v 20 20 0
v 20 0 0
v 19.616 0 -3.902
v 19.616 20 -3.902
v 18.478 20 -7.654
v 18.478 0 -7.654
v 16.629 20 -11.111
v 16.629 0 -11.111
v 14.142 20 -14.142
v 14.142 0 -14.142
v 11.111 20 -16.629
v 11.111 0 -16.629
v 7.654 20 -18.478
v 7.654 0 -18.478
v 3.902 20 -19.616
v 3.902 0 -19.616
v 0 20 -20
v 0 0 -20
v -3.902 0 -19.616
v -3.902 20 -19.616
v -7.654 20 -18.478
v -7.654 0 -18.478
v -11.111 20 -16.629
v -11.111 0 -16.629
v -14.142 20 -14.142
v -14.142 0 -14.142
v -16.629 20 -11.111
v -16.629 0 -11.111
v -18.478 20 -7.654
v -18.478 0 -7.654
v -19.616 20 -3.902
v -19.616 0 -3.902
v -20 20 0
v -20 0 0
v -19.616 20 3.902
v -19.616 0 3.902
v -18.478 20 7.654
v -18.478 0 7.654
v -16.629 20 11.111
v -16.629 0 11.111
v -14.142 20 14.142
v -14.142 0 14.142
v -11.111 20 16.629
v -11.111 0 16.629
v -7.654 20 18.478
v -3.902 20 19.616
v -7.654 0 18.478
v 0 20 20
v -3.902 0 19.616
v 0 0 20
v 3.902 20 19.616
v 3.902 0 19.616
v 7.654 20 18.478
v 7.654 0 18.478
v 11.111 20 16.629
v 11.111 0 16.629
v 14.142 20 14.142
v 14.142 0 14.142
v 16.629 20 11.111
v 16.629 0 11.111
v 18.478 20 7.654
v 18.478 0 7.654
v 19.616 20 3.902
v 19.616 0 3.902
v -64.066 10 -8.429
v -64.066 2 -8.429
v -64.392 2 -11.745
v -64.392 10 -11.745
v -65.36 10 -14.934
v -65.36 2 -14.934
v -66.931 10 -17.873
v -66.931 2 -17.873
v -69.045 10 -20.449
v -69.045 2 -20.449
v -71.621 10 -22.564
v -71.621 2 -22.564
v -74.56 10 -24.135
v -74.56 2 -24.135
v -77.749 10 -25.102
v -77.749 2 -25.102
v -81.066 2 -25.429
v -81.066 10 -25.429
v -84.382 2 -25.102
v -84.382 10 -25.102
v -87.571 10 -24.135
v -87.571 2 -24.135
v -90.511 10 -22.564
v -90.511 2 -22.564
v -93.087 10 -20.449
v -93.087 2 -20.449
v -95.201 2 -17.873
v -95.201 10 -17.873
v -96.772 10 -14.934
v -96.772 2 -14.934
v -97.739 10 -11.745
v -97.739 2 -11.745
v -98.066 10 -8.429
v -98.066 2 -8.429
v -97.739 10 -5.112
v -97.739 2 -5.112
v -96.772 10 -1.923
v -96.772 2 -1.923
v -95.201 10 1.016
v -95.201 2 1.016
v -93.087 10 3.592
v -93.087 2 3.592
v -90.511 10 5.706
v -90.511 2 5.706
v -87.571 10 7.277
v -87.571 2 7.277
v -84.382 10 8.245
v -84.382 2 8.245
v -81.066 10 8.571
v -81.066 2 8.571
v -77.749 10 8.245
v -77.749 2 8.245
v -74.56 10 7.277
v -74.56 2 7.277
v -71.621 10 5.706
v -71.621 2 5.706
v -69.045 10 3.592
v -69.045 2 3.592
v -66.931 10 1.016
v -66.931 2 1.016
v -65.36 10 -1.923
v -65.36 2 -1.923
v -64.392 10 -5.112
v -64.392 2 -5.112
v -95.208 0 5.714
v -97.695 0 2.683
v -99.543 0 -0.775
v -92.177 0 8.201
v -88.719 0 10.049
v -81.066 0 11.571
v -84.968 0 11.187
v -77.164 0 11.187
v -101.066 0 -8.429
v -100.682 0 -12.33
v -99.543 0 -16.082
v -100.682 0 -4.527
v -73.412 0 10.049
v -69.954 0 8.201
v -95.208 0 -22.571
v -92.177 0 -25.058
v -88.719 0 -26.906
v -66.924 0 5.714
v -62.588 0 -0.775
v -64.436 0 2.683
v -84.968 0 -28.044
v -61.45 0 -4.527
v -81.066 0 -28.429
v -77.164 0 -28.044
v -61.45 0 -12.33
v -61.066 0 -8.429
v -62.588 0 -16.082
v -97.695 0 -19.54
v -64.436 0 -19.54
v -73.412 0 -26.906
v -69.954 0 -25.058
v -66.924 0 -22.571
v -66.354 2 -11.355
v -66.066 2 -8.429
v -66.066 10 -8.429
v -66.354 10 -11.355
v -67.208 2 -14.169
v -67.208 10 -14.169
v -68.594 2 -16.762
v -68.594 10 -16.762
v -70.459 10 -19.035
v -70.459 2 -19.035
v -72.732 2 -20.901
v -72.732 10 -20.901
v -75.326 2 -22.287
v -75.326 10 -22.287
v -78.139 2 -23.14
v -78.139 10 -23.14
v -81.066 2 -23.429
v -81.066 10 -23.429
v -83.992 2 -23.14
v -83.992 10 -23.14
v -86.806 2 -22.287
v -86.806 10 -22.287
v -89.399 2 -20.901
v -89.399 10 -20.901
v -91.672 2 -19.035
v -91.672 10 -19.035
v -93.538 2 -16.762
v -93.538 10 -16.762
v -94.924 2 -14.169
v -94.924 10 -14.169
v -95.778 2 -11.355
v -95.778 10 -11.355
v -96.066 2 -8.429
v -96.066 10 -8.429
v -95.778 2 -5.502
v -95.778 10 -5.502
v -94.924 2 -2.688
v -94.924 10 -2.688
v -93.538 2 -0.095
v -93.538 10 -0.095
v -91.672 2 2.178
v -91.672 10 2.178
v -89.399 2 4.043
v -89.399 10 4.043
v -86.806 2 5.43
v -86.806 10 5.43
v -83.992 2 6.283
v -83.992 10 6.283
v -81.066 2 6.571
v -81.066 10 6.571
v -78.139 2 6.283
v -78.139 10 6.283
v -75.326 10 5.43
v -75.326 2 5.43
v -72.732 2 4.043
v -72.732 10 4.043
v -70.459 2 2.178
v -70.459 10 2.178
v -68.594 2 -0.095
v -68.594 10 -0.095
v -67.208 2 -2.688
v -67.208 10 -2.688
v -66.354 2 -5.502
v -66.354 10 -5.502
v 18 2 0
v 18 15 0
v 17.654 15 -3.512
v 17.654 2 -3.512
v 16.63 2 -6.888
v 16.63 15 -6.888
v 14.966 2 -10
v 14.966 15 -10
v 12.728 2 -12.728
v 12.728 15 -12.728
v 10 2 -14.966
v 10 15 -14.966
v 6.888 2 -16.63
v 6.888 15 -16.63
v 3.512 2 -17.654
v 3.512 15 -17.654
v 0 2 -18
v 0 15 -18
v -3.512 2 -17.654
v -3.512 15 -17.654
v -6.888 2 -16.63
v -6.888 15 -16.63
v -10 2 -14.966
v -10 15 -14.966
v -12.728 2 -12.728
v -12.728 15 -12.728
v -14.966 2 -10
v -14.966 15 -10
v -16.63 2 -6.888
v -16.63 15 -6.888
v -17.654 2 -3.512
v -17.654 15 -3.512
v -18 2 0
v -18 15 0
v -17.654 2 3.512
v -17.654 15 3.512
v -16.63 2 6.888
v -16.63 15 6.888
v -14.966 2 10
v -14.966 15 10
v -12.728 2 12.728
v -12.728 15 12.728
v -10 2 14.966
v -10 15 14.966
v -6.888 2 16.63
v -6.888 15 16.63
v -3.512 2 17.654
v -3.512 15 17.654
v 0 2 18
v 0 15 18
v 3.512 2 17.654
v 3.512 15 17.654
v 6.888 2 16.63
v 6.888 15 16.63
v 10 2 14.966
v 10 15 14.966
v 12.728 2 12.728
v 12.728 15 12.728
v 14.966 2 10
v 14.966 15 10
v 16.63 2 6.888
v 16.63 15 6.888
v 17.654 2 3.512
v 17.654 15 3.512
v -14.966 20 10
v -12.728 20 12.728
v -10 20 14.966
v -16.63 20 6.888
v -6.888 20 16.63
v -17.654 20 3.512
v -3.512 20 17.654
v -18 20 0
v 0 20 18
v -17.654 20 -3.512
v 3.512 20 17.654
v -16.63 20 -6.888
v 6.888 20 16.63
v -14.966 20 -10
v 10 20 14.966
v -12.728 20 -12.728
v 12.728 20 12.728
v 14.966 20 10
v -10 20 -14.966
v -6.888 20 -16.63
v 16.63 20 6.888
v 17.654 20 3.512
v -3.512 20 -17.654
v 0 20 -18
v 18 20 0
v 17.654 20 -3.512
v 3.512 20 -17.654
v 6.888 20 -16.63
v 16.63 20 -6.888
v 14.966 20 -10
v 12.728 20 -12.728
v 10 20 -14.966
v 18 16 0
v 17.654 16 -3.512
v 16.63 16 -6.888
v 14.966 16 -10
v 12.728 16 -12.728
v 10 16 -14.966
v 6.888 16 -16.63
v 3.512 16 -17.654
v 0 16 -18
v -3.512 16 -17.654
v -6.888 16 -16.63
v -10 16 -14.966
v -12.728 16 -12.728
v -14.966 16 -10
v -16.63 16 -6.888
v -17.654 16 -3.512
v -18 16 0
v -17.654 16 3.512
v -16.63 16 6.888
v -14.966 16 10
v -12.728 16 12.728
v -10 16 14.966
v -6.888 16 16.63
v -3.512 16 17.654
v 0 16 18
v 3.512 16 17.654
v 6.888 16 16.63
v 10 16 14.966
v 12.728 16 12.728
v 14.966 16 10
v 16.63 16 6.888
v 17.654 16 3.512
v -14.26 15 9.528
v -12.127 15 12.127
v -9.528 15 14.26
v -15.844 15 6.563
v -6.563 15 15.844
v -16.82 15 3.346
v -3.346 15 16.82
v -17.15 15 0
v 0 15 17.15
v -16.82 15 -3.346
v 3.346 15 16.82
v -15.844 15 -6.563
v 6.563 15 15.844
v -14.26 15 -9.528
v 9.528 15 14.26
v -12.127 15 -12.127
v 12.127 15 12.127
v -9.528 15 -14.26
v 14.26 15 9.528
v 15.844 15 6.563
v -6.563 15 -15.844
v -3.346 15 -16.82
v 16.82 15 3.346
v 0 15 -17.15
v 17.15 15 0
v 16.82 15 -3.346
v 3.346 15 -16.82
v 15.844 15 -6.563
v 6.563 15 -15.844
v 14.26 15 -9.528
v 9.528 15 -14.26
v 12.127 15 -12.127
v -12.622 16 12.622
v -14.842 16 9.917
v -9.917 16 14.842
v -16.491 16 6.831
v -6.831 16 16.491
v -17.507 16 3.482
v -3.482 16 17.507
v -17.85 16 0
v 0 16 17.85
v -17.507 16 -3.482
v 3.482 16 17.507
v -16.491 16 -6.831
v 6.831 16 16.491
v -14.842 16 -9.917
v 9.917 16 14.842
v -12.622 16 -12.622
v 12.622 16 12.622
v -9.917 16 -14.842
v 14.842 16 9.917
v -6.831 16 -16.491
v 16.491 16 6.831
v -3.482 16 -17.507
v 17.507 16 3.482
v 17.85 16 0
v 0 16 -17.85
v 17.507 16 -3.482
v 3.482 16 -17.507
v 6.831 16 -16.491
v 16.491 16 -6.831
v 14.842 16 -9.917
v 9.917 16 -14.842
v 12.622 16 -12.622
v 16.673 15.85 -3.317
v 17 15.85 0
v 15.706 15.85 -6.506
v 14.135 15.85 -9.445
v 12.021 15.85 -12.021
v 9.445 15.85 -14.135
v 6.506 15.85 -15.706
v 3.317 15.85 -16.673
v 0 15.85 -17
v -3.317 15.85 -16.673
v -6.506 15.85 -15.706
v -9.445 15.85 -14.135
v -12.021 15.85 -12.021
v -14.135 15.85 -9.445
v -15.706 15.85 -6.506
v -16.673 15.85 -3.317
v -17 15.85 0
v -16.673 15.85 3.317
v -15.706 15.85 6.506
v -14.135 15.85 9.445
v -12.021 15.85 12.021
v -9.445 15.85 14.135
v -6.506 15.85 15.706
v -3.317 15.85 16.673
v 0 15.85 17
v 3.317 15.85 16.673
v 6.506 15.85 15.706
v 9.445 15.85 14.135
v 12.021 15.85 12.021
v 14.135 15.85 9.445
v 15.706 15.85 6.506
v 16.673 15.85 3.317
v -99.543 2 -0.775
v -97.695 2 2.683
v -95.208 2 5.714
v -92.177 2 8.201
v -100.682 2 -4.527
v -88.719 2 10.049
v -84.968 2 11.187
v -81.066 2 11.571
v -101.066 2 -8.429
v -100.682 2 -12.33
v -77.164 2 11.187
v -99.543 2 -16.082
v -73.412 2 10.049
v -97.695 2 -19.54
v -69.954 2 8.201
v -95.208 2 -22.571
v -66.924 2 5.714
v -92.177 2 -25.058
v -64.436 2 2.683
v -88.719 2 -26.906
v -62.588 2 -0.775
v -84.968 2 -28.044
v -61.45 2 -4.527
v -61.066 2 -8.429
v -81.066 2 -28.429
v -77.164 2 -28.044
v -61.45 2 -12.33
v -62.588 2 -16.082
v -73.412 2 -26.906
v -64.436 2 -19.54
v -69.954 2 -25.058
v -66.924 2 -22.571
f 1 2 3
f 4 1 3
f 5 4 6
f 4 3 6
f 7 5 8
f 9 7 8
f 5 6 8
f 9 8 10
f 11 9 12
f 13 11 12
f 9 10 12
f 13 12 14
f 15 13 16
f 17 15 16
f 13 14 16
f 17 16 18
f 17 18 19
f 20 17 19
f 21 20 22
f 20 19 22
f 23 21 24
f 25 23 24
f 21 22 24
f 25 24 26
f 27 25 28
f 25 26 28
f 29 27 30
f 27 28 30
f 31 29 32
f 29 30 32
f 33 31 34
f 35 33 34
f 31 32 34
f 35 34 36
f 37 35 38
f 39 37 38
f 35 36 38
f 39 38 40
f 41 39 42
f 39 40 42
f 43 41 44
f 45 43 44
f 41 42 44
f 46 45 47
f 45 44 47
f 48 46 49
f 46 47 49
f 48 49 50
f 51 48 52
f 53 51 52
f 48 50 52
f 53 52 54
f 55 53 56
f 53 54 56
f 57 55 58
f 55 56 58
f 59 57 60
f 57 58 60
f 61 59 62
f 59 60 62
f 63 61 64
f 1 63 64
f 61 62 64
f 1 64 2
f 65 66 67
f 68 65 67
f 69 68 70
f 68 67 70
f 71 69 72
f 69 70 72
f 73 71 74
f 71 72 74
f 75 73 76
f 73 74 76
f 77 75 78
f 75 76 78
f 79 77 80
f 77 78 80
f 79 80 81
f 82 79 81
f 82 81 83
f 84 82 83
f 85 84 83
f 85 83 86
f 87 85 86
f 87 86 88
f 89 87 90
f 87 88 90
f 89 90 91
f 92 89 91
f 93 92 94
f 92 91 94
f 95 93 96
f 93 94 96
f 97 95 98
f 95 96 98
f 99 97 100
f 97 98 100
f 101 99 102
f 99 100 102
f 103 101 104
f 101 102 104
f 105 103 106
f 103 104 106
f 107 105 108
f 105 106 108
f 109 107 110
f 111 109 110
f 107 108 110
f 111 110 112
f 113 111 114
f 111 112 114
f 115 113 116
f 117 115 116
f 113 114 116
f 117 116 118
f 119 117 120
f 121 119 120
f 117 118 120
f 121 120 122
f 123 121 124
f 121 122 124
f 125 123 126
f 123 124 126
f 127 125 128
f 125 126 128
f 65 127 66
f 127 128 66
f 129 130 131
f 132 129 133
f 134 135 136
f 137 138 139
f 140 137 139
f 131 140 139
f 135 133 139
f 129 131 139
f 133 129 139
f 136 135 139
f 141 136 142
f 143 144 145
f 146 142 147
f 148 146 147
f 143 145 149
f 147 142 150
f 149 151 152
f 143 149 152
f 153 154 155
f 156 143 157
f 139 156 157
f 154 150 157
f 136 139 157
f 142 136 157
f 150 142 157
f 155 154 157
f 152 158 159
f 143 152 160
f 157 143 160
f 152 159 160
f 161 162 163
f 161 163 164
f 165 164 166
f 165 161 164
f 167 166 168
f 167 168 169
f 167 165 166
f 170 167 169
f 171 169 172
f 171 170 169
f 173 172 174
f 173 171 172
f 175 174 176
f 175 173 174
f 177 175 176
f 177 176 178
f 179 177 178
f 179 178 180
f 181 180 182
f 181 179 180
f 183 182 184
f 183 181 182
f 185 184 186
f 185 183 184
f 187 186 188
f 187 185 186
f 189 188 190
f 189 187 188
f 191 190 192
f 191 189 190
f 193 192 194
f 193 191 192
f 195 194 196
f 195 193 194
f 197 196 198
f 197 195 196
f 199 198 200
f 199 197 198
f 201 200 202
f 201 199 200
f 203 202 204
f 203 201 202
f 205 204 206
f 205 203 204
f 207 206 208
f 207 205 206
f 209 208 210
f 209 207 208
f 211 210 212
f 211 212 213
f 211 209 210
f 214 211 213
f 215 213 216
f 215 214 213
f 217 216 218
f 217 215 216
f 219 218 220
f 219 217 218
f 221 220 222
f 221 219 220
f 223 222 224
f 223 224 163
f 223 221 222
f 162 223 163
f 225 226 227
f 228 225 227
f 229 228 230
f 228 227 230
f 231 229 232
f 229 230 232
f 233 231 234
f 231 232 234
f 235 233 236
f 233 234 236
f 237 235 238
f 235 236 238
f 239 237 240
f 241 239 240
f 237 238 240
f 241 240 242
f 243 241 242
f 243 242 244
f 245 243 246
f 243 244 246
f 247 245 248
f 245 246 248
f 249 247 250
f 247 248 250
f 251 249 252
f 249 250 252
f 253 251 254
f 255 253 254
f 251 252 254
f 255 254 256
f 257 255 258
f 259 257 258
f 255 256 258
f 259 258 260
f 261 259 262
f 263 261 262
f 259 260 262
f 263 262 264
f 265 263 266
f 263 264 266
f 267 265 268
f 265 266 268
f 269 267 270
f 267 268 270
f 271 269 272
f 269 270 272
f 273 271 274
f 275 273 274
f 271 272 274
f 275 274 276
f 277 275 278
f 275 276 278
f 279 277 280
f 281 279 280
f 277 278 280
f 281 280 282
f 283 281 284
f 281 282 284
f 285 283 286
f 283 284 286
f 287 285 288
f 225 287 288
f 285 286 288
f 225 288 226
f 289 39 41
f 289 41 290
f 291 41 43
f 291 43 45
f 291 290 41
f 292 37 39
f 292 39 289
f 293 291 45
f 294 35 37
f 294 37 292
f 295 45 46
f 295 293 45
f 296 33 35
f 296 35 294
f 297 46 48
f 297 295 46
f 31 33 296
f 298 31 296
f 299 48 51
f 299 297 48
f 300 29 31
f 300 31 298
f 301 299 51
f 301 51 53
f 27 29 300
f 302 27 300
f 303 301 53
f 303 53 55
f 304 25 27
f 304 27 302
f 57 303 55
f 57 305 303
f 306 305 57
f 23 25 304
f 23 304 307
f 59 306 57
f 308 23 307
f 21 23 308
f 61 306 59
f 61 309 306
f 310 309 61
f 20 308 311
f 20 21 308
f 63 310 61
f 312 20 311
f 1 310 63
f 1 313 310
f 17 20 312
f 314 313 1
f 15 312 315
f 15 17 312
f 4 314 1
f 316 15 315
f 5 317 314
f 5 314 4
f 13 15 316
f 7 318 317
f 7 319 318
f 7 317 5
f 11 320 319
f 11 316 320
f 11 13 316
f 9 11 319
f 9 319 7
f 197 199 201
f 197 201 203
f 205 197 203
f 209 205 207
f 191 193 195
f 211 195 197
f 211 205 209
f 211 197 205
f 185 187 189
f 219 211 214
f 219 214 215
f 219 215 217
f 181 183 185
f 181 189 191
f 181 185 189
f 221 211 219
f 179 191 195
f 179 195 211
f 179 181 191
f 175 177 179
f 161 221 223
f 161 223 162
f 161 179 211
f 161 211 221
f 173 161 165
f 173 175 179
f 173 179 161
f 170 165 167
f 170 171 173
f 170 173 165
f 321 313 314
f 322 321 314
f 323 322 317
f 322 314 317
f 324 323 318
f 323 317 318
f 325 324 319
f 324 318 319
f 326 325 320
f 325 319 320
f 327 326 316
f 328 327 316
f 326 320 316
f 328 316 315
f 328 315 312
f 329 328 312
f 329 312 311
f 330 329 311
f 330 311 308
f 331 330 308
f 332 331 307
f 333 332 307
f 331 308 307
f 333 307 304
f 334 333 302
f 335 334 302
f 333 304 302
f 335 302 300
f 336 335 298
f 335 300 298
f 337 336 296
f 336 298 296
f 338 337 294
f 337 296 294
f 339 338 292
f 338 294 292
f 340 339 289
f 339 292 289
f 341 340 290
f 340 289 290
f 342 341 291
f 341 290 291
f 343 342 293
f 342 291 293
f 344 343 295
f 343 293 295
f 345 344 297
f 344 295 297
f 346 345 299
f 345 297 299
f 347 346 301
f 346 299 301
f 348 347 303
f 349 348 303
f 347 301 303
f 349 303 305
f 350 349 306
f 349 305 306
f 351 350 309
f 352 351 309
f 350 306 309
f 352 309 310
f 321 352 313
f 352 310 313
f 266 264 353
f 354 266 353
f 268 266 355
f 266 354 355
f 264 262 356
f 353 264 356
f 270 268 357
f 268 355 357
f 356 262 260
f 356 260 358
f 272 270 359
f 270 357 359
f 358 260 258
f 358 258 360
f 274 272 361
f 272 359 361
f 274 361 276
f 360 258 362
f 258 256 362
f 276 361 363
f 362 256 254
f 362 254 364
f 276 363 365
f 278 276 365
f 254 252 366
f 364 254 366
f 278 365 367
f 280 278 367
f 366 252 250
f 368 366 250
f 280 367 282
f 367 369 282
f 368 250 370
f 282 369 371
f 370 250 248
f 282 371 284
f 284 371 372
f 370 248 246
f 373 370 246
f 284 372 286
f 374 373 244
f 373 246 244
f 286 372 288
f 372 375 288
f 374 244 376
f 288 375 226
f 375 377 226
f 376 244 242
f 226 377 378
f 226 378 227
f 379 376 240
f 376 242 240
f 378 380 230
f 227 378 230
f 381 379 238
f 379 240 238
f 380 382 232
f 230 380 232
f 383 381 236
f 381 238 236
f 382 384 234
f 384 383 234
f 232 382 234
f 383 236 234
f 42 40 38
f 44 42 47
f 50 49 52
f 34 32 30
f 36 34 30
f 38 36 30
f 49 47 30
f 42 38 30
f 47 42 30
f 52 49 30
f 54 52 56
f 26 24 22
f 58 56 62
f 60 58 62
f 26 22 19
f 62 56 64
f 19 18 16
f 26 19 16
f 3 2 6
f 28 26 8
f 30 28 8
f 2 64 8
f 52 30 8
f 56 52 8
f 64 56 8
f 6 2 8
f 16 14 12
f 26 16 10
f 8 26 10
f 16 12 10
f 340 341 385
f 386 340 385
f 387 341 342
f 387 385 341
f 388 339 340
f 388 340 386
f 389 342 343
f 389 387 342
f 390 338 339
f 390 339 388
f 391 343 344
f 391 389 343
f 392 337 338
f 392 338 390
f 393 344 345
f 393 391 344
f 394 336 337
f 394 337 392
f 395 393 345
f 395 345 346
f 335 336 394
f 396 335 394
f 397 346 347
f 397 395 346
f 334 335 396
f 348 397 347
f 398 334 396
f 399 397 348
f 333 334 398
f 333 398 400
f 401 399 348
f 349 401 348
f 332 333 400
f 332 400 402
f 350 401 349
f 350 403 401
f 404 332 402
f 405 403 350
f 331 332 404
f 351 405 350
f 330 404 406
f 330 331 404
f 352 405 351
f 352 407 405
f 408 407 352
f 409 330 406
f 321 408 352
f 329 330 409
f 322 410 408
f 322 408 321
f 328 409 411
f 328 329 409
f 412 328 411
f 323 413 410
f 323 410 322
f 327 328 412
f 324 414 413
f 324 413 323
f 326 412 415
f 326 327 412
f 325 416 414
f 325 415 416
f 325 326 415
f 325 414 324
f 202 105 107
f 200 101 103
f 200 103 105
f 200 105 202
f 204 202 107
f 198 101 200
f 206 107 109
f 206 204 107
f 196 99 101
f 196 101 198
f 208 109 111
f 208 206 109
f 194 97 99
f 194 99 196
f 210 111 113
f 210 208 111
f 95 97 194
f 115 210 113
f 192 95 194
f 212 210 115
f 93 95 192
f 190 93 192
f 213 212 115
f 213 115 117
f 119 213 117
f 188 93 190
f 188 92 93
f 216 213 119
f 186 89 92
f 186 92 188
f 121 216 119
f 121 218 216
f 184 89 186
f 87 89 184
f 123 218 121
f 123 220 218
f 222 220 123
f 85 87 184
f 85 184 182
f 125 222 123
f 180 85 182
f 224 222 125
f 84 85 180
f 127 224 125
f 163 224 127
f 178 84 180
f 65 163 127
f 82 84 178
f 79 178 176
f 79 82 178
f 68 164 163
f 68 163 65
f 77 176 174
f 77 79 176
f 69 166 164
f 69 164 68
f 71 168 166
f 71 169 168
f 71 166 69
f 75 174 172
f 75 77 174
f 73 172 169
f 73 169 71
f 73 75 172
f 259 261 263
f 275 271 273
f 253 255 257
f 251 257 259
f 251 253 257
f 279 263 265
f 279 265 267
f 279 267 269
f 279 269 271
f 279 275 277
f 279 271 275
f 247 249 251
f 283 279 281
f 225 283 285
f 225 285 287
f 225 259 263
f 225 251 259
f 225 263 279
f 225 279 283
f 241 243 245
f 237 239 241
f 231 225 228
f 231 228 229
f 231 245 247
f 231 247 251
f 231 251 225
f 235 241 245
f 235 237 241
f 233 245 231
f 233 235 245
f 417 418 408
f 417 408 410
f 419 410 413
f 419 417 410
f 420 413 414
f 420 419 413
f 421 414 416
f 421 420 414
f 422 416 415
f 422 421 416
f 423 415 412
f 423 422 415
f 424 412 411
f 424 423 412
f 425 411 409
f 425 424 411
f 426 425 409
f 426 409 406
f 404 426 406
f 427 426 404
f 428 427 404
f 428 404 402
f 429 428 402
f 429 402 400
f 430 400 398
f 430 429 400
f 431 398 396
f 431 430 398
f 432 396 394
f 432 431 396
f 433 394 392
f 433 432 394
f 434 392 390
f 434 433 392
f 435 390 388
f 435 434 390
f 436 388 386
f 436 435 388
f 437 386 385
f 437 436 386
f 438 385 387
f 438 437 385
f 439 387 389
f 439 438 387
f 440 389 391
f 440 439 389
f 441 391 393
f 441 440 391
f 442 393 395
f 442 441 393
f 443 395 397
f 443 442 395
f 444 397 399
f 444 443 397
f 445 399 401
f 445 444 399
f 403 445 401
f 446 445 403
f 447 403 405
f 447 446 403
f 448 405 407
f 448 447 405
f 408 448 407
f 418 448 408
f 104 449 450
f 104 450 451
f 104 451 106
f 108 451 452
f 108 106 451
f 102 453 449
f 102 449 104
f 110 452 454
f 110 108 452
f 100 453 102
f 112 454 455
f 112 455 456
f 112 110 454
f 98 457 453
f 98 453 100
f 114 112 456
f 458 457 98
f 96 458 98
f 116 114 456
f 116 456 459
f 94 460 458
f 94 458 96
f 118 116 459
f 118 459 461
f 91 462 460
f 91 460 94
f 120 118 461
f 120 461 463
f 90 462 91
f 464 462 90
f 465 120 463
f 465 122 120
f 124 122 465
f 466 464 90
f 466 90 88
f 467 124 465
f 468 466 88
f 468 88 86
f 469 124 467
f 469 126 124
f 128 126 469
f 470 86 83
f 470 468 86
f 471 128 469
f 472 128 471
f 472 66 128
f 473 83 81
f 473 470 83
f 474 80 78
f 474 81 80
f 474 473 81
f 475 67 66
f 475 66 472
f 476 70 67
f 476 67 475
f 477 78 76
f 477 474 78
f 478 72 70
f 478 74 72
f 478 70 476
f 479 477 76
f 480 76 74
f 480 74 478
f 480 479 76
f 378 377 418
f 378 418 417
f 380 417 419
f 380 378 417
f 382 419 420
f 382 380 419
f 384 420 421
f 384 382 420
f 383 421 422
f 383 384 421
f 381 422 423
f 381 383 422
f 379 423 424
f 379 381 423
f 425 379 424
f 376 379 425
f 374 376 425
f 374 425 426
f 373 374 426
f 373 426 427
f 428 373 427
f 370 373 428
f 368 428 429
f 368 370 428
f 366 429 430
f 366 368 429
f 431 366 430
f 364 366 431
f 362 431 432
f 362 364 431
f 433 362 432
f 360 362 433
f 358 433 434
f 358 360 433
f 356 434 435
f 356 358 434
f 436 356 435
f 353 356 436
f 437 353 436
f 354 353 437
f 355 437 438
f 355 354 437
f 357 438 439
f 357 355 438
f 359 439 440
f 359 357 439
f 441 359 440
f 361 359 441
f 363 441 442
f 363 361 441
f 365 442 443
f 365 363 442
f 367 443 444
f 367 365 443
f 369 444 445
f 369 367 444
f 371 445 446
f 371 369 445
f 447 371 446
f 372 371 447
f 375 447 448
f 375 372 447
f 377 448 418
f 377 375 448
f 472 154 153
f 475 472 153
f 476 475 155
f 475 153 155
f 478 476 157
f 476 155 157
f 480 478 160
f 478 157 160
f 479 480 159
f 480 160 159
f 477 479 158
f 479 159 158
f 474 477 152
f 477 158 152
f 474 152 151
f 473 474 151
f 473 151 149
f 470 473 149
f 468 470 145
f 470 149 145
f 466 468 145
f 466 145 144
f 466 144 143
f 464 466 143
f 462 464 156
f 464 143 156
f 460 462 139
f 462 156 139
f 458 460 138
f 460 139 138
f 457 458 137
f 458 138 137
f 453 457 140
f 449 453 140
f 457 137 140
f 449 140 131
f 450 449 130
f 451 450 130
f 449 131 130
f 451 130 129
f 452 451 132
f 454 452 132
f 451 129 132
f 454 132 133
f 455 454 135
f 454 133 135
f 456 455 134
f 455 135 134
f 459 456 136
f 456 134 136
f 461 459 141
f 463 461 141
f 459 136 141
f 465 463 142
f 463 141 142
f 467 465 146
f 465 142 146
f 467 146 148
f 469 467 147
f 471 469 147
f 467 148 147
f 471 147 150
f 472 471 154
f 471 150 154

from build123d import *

# Parameters (mm, degrees)
SKETCH1_R             = 20
BOSS_EXTRUDE2_DEPTH   = 20
SKETCH2_R             = 18
CUT_EXTRUDE1_DEPTH    = 4
SKETCH4_R             = 17
CUT_EXTRUDE2_DEPTH    = 1
SKETCH5_R             = 18
CUT_EXTRUDE4_DEPTH    = 13
CHAMFER1_SIZE         = 0.85
CHAMFER1_SIZE2        = 0.149877934
CHAMFER1_PART_2_SIZE  = 0.85
CHAMFER1_PART_2_SIZE2 = 0.149877934
SKETCH6_R             = 20
BOSS_EXTRUDE3_DEPTH   = 2
SKETCH8_R             = 17
SKETCH8_R_2           = 15
BOSS_EXTRUDE5_DEPTH   = 8


with BuildPart() as part:
    # Sketch1 → Boss-Extrude2 (new body)
    with BuildSketch(Plane(origin=(0, 0, 0), x_dir=(1, 0, 0), z_dir=(0, 1, 0))):
        Circle(SKETCH1_R)
    extrude(amount=BOSS_EXTRUDE2_DEPTH)

    # Sketch2 → Cut-Extrude1 (cut)
    with BuildSketch(Plane(origin=(0, 20, 0), x_dir=(1, 0, 0), z_dir=(0, 1, 0))):
        Circle(SKETCH2_R)
    extrude(amount=-CUT_EXTRUDE1_DEPTH, mode=Mode.SUBTRACT)

    # Sketch4 → Cut-Extrude2 (cut)
    with BuildSketch(Plane(origin=(0, 16, 0), x_dir=(1, 0, 0), z_dir=(0, 1, 0))):
        Circle(SKETCH4_R)
    extrude(amount=-CUT_EXTRUDE2_DEPTH, mode=Mode.SUBTRACT)

    # Sketch5 → Cut-Extrude4 (cut)
    with BuildSketch(Plane(origin=(0, 15, 0), x_dir=(1, 0, 0), z_dir=(0, 1, 0))):
        Circle(SKETCH5_R)
    extrude(amount=-CUT_EXTRUDE4_DEPTH, mode=Mode.SUBTRACT)

    # Chamfer1
    chamfer1_edges = [part.edges().sort_by_distance(p)[0] for p in [
        (-17, 16, 0),
    ]]
    chamfer1_side = [part.faces().sort_by_distance(p)[0] for p in [
        (-17.490883118, 16, 0),
    ]]
    chamfer(chamfer1_edges, length=CHAMFER1_SIZE, length2=CHAMFER1_SIZE2, reference=chamfer1_side[0])

    # Chamfer1 part 2
    chamfer1_part_2_edges = [part.edges().sort_by_distance(p)[0] for p in [
        (-17, 15, 0),
    ]]
    chamfer1_part_2_side = [part.faces().sort_by_distance(p)[0] for p in [
        (-17, 15.5, 0),
    ]]
    chamfer(chamfer1_part_2_edges, length=CHAMFER1_PART_2_SIZE, length2=CHAMFER1_PART_2_SIZE2, reference=chamfer1_part_2_side[0])


with BuildPart() as body_2:
    # Sketch6 → Boss-Extrude3 (new body)
    with BuildSketch(Plane(origin=(0, 0, 0), x_dir=(1, 0, 0), z_dir=(0, 1, 0))):
        with Locations((-81.065822517, 8.428593597)):
            Circle(SKETCH6_R)
    extrude(amount=BOSS_EXTRUDE3_DEPTH)

    # Sketch8 → Boss-Extrude5 (add)
    with BuildSketch(Plane(origin=(0, 2, 0), x_dir=(1, 0, 0), z_dir=(0, 1, 0))):
        with Locations((-81.065822517, 8.428593597)):
            Circle(SKETCH8_R)
        with Locations((-81.065822517, 8.428593597)):
            Circle(SKETCH8_R_2, mode=Mode.SUBTRACT)
    extrude(amount=BOSS_EXTRUDE5_DEPTH)


solid = Compound([part.part, body_2.part])
